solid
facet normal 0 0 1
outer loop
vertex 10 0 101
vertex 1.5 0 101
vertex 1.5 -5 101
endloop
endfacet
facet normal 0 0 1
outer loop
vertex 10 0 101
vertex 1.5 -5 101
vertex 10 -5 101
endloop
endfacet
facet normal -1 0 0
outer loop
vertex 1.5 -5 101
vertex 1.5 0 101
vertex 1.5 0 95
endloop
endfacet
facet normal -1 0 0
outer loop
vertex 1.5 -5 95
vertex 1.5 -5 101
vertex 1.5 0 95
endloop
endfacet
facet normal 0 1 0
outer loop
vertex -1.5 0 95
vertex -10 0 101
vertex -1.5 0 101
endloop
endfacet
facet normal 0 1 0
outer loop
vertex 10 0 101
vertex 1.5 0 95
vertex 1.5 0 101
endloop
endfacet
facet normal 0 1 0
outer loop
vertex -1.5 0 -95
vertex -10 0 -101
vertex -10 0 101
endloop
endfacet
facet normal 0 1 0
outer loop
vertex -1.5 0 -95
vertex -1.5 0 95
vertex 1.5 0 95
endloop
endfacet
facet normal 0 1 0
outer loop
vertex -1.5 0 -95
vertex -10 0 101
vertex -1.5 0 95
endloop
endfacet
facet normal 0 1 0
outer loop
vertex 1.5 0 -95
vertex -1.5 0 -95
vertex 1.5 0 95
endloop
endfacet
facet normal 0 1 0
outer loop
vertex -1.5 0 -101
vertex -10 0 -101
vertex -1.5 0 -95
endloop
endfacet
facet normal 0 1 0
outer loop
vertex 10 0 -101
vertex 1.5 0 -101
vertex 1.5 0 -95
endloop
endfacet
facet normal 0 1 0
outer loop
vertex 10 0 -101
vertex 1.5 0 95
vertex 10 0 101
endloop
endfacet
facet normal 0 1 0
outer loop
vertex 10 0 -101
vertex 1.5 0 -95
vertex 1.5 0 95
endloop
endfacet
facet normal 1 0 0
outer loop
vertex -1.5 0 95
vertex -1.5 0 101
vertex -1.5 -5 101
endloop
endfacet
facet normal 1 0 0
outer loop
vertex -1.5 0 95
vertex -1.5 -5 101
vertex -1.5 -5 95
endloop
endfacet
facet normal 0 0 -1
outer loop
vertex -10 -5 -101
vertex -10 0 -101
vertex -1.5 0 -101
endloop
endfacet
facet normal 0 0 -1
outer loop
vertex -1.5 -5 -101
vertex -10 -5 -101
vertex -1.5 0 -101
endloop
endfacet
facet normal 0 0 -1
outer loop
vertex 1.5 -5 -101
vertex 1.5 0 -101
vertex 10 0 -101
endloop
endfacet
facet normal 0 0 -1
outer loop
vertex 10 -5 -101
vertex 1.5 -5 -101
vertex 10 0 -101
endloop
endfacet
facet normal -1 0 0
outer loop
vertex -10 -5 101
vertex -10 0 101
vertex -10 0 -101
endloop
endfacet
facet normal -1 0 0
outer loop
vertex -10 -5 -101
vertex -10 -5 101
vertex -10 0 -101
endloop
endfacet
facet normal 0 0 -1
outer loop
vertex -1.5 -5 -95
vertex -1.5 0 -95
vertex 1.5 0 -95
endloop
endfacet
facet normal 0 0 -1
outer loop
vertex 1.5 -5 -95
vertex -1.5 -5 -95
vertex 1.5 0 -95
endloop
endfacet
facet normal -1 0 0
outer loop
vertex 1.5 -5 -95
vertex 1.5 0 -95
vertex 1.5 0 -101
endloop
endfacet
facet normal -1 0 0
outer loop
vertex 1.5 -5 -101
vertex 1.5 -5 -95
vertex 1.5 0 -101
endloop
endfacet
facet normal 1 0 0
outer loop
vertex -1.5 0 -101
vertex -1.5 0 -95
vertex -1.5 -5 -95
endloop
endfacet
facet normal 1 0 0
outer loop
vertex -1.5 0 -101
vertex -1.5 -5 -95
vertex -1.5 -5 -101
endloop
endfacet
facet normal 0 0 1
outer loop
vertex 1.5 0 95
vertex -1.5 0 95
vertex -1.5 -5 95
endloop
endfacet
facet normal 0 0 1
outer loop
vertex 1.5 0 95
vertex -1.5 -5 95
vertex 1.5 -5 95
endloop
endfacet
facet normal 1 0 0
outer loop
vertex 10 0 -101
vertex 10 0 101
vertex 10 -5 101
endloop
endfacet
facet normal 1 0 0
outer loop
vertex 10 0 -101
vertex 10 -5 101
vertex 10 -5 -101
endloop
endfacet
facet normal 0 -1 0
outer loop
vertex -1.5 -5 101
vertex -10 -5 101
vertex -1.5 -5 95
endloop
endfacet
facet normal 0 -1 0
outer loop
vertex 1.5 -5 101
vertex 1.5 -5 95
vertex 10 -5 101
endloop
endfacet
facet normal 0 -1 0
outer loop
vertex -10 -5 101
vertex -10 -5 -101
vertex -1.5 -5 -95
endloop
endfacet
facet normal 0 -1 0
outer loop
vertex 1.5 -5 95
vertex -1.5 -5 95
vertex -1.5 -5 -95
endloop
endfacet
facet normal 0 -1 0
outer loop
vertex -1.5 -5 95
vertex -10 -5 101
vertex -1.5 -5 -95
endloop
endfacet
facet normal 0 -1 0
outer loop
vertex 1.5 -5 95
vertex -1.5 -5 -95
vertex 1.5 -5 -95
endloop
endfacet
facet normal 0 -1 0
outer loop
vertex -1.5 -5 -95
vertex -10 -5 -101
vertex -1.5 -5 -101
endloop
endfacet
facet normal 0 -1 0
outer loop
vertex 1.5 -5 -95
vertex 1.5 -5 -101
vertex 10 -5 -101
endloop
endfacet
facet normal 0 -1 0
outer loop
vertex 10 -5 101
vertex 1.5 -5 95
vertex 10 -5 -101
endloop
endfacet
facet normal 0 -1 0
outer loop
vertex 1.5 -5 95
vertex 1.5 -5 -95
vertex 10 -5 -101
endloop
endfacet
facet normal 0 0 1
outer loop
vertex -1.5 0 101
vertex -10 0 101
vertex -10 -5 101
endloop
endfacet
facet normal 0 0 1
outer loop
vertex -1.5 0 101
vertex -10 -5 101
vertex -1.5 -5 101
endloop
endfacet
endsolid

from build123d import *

# Parameters (mm, degrees)
SKETCH1_W           = 20
SKETCH1_H           = 202
BOSS_EXTRUDE1_DEPTH = 5
SKETCH2_W           = 3
SKETCH2_H           = 6
CUT_EXTRUDE1_DEPTH  = 102.616927724


with BuildPart() as part:
    # Sketch1 → Boss-Extrude1 (new body)
    with BuildSketch(Plane(origin=(0, 0, 0), x_dir=(1, 0, 0), z_dir=(0, 1, 0))):
        Rectangle(SKETCH1_W, SKETCH1_H)
    extrude(amount=-BOSS_EXTRUDE1_DEPTH)

    # Sketch2 → Cut-Extrude1 (cut, through all)
    with BuildSketch(Plane(origin=(0, 0, 0), x_dir=(1, 0, 0), z_dir=(0, 1, 0))):
        with Locations((0, -98)):
            Rectangle(SKETCH2_W, SKETCH2_H)
        with Locations((0, 98)):
            Rectangle(SKETCH2_W, SKETCH2_H)
    extrude(amount=-CUT_EXTRUDE1_DEPTH, mode=Mode.SUBTRACT)


solid = part.part
